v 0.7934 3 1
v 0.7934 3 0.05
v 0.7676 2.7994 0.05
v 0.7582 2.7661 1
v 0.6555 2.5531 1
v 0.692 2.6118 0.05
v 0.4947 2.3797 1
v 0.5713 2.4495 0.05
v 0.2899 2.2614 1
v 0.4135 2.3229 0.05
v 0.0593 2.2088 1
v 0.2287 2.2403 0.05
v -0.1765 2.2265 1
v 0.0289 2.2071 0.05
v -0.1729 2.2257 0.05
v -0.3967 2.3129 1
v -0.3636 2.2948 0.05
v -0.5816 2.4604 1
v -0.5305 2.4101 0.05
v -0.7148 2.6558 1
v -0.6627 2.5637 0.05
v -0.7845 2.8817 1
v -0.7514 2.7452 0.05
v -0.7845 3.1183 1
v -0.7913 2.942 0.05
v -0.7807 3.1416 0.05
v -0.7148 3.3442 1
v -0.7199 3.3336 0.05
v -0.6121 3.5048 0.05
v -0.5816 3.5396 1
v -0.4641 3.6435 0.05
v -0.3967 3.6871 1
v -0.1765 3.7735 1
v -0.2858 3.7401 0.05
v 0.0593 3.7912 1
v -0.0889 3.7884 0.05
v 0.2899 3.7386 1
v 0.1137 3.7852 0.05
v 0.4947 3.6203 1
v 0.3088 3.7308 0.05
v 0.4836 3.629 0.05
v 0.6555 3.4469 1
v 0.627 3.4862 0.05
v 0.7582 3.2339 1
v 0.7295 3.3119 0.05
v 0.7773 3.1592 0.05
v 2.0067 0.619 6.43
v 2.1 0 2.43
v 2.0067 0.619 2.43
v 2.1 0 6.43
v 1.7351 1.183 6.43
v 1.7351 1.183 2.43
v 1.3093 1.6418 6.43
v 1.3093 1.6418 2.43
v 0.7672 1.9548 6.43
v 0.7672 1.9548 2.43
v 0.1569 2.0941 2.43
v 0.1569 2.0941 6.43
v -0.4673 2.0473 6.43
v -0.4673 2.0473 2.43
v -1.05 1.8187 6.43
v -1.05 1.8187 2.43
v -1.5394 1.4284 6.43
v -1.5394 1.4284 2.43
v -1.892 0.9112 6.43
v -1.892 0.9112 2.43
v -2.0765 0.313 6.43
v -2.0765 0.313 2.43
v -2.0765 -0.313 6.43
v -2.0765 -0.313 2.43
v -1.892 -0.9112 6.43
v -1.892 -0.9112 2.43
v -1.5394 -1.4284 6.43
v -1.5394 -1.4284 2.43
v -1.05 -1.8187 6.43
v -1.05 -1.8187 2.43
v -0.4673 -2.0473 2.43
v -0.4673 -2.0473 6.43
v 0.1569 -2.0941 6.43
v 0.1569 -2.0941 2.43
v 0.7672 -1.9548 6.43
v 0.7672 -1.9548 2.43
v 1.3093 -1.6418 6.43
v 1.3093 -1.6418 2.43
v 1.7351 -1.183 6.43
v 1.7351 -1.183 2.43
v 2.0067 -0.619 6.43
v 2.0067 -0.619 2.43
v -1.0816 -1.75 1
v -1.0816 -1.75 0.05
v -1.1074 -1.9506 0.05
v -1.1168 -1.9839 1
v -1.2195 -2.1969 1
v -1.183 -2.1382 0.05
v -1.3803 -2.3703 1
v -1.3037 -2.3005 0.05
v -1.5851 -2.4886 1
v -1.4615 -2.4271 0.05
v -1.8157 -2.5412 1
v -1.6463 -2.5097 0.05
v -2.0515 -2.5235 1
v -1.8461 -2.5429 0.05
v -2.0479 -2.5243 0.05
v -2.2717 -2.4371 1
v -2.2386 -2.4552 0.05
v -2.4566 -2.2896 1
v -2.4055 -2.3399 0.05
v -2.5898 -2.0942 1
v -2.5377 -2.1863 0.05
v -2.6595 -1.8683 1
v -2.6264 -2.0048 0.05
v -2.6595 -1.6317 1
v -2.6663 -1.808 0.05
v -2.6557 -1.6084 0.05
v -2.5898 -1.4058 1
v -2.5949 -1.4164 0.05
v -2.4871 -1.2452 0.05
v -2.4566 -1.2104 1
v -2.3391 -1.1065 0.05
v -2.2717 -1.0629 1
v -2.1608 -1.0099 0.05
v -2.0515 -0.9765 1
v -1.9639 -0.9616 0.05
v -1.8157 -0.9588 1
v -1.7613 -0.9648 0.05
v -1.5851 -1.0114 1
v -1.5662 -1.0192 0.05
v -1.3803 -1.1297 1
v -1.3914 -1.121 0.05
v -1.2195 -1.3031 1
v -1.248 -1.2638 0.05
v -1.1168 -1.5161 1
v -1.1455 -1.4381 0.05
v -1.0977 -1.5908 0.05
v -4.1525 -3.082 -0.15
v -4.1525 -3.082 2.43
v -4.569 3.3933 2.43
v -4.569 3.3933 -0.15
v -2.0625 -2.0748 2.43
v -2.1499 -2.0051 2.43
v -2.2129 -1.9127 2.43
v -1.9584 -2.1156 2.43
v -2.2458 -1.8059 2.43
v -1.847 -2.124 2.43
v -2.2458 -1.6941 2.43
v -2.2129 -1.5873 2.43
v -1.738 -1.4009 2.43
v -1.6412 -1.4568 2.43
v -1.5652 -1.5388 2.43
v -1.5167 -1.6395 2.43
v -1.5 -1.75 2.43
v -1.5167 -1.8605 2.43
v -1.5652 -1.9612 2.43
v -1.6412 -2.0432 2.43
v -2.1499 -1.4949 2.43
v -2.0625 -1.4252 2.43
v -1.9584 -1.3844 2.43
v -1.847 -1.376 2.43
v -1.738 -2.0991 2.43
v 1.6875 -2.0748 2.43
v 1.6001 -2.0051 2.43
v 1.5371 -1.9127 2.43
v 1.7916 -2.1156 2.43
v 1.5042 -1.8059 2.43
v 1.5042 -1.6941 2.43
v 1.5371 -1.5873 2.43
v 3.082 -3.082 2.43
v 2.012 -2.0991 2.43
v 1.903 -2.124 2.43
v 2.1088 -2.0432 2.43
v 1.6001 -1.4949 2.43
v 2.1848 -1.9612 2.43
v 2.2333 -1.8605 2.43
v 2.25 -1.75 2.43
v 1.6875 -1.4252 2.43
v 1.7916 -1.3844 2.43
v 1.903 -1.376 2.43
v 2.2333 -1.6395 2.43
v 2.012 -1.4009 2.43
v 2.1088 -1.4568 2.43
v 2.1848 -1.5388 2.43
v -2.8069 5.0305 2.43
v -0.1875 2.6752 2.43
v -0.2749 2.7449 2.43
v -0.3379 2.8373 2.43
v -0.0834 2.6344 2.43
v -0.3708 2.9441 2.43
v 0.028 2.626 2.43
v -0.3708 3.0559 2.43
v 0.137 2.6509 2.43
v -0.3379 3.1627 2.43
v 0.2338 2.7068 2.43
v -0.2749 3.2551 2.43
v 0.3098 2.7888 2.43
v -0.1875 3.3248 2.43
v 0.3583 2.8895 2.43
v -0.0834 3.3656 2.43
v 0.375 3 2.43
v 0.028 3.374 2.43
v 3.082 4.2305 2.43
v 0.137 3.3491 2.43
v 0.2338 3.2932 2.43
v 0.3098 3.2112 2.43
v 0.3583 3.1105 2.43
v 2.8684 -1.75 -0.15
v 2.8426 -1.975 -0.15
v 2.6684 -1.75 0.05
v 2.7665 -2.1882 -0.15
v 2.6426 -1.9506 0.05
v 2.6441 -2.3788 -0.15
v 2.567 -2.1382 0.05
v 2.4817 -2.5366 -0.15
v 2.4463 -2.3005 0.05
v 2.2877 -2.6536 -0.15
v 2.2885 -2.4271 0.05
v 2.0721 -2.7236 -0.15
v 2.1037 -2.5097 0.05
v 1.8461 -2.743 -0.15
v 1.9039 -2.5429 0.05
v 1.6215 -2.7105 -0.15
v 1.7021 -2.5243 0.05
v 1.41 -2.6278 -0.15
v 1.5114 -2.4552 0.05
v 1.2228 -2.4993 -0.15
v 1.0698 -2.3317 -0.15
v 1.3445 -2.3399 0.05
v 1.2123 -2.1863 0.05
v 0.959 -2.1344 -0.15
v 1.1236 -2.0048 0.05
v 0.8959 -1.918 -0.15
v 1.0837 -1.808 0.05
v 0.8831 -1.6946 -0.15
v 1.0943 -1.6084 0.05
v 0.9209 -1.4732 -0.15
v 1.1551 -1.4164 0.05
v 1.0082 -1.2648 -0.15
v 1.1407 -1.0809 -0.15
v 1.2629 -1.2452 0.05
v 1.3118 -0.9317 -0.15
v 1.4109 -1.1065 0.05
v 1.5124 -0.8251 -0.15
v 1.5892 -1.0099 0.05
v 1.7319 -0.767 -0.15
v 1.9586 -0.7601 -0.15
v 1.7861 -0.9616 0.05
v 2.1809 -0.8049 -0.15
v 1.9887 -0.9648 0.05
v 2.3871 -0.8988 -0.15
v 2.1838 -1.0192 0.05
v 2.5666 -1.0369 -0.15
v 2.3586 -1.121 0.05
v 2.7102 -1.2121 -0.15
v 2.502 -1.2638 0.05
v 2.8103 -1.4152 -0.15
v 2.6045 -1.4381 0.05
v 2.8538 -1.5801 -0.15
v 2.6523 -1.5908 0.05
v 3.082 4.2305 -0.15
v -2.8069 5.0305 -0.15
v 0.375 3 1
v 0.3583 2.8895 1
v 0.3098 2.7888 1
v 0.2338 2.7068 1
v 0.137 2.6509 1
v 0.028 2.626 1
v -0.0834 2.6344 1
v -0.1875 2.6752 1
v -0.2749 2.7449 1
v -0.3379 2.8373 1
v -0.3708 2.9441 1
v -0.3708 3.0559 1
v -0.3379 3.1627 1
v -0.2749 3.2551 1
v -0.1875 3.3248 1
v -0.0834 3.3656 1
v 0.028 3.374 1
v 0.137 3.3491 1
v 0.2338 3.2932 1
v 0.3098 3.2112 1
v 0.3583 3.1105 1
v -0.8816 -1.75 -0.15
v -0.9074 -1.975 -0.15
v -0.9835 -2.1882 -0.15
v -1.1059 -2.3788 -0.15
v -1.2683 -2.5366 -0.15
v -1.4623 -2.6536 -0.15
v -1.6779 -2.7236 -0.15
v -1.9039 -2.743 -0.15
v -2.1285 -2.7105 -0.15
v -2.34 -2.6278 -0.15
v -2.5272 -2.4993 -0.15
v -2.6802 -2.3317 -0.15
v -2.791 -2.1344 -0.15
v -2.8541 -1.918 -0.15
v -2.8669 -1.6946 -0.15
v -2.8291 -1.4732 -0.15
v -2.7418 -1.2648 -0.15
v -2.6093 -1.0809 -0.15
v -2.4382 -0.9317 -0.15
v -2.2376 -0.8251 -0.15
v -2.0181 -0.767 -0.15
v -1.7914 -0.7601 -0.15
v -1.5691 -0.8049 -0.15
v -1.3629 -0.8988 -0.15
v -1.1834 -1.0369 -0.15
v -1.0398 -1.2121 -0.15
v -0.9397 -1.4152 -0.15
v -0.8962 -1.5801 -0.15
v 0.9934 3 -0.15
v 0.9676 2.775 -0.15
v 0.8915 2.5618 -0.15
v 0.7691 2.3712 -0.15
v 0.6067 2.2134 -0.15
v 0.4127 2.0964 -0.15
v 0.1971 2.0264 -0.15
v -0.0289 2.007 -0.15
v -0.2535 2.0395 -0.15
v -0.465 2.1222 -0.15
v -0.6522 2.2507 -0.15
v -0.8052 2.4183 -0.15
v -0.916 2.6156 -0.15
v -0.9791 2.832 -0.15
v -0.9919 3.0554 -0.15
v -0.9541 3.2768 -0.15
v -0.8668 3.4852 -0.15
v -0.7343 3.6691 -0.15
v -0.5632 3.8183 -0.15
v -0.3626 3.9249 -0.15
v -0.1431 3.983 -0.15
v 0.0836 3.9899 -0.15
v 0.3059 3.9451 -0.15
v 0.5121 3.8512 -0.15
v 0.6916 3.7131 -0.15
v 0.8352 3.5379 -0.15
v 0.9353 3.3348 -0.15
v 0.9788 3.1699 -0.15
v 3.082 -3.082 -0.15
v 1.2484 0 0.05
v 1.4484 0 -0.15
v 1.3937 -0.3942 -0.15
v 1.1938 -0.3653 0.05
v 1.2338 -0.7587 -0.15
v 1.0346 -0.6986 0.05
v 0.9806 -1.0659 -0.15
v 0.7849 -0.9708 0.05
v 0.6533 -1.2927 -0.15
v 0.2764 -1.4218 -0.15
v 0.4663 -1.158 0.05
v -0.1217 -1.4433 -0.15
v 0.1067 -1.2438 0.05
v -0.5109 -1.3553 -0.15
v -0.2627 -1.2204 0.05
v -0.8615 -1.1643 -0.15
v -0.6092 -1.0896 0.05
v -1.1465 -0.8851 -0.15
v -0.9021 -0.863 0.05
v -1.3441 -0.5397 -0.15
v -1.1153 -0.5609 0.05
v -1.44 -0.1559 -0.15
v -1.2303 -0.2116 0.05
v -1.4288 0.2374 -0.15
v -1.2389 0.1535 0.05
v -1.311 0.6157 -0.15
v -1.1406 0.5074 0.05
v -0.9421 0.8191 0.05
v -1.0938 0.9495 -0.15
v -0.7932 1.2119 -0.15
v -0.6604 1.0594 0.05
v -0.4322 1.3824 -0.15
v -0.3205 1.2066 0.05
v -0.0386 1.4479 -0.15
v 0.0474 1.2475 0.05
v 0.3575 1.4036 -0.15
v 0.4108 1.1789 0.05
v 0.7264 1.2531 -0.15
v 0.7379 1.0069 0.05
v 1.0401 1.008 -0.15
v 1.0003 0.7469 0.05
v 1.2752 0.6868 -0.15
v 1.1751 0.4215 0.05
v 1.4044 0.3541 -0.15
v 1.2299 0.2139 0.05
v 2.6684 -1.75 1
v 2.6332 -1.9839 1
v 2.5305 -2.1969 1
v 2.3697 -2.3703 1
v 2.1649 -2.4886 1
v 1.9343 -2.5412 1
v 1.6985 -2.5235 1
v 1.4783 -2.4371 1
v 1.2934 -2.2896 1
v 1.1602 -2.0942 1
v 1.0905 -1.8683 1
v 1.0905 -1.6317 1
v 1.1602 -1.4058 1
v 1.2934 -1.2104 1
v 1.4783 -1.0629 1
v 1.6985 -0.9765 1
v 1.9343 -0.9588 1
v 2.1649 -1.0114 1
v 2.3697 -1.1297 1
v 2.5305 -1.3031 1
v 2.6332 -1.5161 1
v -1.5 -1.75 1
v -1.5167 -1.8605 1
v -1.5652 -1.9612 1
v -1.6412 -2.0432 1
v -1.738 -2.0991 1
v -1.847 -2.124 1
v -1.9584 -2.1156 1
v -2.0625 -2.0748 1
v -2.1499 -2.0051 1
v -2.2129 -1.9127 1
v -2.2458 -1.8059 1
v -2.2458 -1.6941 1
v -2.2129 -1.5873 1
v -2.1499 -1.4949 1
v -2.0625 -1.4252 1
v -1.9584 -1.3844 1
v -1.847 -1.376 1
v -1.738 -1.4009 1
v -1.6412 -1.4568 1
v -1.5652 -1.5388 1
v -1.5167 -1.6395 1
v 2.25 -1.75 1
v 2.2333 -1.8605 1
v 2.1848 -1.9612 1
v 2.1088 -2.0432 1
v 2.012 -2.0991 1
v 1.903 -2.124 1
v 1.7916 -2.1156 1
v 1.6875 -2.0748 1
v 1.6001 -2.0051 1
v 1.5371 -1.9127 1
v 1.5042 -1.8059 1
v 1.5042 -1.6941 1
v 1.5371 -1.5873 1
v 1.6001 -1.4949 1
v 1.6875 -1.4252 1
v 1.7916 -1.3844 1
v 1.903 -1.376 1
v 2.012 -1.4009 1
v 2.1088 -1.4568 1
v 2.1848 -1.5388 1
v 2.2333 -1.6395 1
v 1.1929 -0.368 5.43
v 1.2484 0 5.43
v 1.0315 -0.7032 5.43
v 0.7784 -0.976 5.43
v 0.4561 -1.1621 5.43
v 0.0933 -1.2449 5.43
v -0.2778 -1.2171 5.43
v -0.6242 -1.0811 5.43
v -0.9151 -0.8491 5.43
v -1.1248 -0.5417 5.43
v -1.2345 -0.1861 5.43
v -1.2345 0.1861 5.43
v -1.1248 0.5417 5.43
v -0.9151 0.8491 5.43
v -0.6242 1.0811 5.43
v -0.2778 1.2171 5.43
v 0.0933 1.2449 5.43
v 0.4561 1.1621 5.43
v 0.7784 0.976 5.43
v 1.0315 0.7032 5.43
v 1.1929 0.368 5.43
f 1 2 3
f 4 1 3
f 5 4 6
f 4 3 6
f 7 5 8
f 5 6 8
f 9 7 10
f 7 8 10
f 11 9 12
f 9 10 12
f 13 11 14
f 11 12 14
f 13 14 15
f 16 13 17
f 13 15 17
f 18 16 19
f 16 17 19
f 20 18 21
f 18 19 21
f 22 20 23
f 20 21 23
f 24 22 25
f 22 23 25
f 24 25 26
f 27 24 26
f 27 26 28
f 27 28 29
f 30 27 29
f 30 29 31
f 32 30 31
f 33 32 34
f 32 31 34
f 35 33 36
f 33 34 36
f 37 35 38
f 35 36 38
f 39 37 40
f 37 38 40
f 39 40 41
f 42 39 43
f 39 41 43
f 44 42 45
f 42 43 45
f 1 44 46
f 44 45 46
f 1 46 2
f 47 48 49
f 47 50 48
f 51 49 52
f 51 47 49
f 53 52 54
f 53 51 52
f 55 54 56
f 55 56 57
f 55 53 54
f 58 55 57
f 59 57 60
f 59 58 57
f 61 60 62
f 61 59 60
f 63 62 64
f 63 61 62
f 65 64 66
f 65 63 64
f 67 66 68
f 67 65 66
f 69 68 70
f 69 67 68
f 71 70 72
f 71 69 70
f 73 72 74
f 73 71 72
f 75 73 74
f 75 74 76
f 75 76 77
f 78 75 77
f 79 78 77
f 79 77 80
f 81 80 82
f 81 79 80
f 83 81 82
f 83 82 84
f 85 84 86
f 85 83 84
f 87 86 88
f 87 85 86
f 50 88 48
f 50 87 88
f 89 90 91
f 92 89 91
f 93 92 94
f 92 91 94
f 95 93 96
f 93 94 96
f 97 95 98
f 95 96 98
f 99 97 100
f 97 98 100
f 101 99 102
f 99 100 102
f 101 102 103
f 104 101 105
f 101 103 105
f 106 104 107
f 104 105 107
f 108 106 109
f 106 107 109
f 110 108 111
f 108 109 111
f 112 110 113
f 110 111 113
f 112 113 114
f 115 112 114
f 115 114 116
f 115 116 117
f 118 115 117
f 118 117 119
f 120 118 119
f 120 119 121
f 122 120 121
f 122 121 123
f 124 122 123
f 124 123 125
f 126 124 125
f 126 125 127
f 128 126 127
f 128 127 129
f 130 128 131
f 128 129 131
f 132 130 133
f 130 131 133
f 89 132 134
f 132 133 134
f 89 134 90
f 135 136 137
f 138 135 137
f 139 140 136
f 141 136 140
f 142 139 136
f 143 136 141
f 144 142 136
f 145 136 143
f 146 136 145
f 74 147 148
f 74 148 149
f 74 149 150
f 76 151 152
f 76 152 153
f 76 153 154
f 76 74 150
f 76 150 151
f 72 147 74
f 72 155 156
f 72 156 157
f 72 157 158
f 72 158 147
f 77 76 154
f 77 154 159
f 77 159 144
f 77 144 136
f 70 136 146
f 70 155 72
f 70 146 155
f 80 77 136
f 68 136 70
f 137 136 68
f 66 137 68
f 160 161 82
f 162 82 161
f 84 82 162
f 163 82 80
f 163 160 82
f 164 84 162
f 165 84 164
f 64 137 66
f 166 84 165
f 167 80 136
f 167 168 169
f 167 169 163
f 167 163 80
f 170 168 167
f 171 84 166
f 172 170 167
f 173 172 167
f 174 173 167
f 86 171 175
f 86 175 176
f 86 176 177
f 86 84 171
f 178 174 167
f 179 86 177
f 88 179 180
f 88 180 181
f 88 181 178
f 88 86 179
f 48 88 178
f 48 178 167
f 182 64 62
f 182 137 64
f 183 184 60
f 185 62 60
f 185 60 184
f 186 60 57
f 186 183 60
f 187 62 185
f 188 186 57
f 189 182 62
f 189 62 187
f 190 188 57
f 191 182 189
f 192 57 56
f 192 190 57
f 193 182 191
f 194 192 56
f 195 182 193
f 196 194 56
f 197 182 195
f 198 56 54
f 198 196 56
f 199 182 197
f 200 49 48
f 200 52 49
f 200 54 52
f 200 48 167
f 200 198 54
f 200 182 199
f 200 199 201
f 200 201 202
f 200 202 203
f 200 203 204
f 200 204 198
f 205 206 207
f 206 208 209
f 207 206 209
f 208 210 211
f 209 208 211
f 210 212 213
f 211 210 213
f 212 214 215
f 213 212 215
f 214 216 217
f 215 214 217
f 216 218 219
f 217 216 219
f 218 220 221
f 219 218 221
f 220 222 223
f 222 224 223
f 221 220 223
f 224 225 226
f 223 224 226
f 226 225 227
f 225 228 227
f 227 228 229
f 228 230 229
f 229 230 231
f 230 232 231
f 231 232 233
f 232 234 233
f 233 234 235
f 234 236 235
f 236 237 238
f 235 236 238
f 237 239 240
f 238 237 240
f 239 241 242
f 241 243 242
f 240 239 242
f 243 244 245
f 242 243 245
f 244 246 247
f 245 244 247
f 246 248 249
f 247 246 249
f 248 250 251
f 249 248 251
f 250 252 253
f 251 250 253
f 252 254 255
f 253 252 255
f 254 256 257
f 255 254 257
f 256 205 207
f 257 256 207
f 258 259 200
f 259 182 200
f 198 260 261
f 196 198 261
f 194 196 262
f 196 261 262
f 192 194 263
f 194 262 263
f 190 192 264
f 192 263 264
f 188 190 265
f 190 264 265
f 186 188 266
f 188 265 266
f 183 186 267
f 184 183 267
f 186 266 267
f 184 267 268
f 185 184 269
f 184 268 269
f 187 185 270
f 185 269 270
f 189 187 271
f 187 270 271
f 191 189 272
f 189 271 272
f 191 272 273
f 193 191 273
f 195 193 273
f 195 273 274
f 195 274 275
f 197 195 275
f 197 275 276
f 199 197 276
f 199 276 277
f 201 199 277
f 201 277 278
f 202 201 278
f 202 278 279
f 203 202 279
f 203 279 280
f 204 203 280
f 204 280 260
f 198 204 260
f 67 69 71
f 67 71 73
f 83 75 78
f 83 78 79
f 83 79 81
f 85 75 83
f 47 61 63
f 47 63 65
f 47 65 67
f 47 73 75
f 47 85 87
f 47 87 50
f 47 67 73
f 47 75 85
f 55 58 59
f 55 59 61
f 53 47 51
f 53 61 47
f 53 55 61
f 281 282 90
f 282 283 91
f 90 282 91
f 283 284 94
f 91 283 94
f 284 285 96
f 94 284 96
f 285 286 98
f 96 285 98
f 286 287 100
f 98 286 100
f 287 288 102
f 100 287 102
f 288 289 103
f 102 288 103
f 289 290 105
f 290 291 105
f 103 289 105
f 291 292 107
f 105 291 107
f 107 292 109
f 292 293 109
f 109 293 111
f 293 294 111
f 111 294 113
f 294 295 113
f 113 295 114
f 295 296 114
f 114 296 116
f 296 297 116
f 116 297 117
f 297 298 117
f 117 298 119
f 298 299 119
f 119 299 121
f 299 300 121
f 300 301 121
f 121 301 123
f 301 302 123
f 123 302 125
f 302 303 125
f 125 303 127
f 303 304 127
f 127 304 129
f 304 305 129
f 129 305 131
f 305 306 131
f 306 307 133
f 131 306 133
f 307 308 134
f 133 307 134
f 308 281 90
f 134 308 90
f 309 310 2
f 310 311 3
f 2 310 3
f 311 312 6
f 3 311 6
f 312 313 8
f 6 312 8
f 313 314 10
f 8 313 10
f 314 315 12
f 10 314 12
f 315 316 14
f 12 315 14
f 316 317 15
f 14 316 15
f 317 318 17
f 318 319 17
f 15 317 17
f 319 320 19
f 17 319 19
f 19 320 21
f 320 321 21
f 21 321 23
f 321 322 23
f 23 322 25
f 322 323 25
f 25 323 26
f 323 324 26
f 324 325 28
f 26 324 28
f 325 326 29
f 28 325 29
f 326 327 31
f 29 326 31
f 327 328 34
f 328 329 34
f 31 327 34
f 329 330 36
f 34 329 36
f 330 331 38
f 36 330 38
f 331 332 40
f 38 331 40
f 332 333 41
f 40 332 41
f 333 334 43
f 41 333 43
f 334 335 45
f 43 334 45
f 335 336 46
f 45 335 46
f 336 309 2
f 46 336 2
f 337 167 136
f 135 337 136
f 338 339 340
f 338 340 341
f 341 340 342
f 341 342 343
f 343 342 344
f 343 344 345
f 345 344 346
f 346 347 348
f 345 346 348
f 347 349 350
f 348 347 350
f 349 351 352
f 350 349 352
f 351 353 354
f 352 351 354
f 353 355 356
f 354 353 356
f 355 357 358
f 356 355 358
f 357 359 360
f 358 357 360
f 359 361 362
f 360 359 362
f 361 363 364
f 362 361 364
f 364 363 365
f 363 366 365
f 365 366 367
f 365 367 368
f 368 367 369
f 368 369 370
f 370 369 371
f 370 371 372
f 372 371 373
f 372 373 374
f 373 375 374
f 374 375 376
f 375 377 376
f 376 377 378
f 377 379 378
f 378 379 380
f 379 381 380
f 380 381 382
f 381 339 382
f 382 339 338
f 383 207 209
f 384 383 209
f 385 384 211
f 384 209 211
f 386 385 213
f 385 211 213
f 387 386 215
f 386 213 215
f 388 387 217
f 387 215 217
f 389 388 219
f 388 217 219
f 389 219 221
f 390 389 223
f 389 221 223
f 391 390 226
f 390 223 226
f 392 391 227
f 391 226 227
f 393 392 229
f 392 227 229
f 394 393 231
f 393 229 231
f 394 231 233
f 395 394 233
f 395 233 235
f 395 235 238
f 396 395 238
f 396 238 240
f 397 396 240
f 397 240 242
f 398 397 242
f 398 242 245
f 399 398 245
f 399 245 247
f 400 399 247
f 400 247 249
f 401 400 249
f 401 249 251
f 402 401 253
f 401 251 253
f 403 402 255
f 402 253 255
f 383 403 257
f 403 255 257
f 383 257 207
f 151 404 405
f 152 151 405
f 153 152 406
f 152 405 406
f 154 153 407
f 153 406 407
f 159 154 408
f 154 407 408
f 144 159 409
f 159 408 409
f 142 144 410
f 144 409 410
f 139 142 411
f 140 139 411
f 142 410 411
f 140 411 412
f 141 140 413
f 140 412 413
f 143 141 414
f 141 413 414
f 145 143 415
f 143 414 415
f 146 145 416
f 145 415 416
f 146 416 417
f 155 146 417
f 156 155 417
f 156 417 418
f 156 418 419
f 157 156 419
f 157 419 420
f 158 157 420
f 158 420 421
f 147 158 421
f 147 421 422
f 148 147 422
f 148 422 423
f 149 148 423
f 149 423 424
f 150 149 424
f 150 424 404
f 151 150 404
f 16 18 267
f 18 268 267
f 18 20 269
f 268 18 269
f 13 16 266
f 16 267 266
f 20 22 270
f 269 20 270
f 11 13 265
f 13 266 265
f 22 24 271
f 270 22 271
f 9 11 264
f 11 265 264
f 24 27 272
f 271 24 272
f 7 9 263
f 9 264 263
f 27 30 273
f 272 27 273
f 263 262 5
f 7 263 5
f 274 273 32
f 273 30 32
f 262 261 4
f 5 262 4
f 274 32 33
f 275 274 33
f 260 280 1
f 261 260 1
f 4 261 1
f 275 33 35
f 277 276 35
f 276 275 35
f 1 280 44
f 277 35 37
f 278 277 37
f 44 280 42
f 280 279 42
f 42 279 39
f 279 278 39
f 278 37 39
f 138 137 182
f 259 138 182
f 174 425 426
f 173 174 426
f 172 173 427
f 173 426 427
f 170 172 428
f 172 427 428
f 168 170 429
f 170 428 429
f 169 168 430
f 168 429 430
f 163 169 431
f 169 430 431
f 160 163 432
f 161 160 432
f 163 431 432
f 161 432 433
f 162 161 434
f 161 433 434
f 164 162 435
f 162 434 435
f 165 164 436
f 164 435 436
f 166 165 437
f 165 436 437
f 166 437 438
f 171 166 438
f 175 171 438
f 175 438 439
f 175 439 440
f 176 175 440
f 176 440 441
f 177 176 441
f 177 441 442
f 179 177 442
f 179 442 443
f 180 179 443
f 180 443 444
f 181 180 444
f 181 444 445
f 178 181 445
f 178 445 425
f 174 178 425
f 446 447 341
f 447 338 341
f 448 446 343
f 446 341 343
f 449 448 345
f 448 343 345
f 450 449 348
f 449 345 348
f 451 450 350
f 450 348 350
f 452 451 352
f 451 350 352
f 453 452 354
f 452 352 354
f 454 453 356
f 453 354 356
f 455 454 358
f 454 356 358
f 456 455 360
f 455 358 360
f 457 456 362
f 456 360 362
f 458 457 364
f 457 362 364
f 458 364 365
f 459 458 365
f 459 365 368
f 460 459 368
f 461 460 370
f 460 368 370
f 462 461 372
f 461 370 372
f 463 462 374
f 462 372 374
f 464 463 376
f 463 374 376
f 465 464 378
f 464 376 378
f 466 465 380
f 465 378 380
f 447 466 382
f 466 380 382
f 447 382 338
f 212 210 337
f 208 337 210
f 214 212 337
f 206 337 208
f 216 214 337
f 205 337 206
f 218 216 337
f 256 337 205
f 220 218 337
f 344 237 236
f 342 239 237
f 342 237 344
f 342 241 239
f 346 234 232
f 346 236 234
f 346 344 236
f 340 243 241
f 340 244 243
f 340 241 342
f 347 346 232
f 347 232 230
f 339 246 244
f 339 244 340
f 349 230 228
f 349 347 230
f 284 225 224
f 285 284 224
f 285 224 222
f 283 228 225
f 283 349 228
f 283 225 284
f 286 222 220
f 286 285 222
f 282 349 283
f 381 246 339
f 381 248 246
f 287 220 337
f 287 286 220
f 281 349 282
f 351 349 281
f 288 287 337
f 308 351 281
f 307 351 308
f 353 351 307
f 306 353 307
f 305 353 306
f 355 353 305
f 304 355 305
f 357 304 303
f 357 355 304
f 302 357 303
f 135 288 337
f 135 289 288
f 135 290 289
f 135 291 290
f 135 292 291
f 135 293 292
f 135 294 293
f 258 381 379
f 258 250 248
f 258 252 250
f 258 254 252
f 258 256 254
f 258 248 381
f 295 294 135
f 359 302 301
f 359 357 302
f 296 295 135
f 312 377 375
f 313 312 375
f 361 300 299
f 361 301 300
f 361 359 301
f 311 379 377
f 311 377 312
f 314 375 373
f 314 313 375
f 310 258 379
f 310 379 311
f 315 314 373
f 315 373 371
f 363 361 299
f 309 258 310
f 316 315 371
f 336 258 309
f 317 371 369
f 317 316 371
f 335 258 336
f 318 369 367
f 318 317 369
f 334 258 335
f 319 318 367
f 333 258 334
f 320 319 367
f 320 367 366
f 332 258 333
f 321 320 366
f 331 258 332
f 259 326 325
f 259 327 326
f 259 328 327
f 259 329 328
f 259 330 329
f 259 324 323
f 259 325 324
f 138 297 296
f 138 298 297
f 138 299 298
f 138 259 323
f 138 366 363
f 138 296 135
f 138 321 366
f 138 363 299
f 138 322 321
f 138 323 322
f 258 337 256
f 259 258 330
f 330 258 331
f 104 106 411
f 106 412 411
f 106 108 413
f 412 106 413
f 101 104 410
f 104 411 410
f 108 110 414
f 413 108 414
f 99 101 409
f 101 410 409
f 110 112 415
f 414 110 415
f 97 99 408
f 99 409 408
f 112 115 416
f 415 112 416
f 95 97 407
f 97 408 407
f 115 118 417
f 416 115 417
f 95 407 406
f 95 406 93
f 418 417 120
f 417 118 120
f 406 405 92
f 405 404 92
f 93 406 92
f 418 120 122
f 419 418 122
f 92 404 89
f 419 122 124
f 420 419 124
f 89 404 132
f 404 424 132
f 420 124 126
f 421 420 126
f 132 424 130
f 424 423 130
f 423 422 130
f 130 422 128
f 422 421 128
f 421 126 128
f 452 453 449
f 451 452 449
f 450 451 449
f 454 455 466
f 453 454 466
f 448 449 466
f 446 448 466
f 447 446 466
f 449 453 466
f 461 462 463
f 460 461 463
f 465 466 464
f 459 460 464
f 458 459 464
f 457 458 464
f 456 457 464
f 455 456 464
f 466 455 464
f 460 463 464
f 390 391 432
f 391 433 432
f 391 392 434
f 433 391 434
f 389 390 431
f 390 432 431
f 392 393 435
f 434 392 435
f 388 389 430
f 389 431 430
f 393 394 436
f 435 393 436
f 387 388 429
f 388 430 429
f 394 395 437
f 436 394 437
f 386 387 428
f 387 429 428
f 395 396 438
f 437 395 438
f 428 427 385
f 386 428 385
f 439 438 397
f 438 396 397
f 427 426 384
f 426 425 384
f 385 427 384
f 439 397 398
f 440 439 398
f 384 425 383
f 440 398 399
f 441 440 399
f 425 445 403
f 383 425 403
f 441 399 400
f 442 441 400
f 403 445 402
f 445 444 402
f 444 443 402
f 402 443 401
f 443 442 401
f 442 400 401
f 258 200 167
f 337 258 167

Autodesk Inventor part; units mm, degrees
ref_plane "YZ Plane" through (0, 0, 0) normal (1, 0, 0) x (0, 1, 0)
ref_plane "XZ Plane" through (0, 0, 0) normal (0, 1, 0) x (-1, 0, 0)
ref_plane "XY Plane" through (0, 0, 0) normal (0, 0, 1) x (1, 0, 0)
sketch "Sketch1" plane through (0, 0, 0) normal (0, 0, 1) x (1, 0, 0)
  line L0 (-2.8403, 5.136) -> (-4.6718, 3.4343)
  line L1 (-4.2463, -3.182) -> (-4.6718, 3.4343)
  line L2 (-4.2463, -3.182) -> (3.182, -3.182)
  line L3 (3.182, -3.182) -> (3.182, 4.3178)
  line L4 (-2.8403, 5.136) -> (3.182, 4.3178)
  circle A0 centre (0, 0) radius 1.2484
  circle A1 centre (0, 3) radius 0.7934
  circle A2 centre (-1.875, -1.75) radius 0.7934
  circle A3 centre (1.875, -1.75) radius 0.7934
  line L5 (-4.569, 3.3933) -> (-2.8069, 5.0305)
  line L6 (-2.8069, 5.0305) -> (3.082, 4.2305)
  line L7 (3.082, 4.2305) -> (3.082, -3.082)
  line L8 (3.082, -3.082) -> (-4.1525, -3.082)
  line L9 (-4.1525, -3.082) -> (-4.569, 3.3933)
  dimension "d0" = 0.1
extrude "Extrusion1" add sketch "Sketch1" along normal blind 1 contours L5 L6 L7 L8 L9
sketch "Sketch2" plane through (0, 0, 1) normal (0, 0, 1) x (1, 0, 0)
  line L0 (-2.8403, 5.136) -> (-4.6718, 3.4343)
  line L1 (-4.2463, -3.182) -> (-4.6718, 3.4343)
  line L2 (-4.2463, -3.182) -> (3.182, -3.182)
  line L3 (3.182, -3.182) -> (3.182, 4.3178)
  line L4 (-2.8403, 5.136) -> (3.182, 4.3178)
  circle A0 centre (0, 0) radius 1.2484
  circle A1 centre (0, 3) radius 0.7934
  circle A2 centre (-1.875, -1.75) radius 0.7934
  circle A3 centre (1.875, -1.75) radius 0.7934
  line L5 (-4.569, 3.3933) -> (-2.8069, 5.0305)
  line L6 (-2.8069, 5.0305) -> (3.082, 4.2305)
  line L7 (3.082, 4.2305) -> (3.082, -3.082)
  line L8 (3.082, -3.082) -> (-4.1525, -3.082)
  line L9 (-4.1525, -3.082) -> (-4.569, 3.3933)
  circle A4 centre (0, 3) radius 0.375
  circle A5 centre (1.875, -1.75) radius 0.375
  circle A6 centre (-1.875, -1.75) radius 0.375
  dimension "d3" = 0.1
  dimension "d4" = 1.5869
  dimension "d5" = 0.75
  dimension "d6" = 0.75
  dimension "d7" = 0.75
extrude "Extrusion2" add sketch "Sketch2" along normal blind 4.43 contours A1 | A2 | A3 | L5 L6 L7 L8 L9
sketch "Sketch3" plane through (0, 0, 5.43) normal (0, 0, 1) x (1, 0, 0)
  line L0 (-2.8403, 5.136) -> (-4.6718, 3.4343)
  line L1 (-4.2463, -3.182) -> (-4.6718, 3.4343)
  line L2 (-4.2463, -3.182) -> (3.182, -3.182)
  line L3 (3.182, -3.182) -> (3.182, 4.3178)
  line L4 (-2.8403, 5.136) -> (3.182, 4.3178)
  circle A0 centre (0, 0) radius 1.2484
  circle A1 centre (0, 3) radius 0.7934
  circle A2 centre (-1.875, -1.75) radius 0.7934
  circle A3 centre (1.875, -1.75) radius 0.7934
  line L5 (-4.569, 3.3933) -> (-2.8069, 5.0305)
  line L6 (-2.8069, 5.0305) -> (3.082, 4.2305)
  line L7 (3.082, 4.2305) -> (3.082, -3.082)
  line L8 (3.082, -3.082) -> (-4.1525, -3.082)
  line L9 (-4.1525, -3.082) -> (-4.569, 3.3933)
  circle A4 centre (0, 3) radius 0.375
  circle A5 centre (1.875, -1.75) radius 0.375
  circle A6 centre (-1.875, -1.75) radius 0.375
  dimension "d10" = 0.1
  dimension "d11" = 1.5869
  dimension "d12" = 0.75
  dimension "d13" = 0.75
  dimension "d14" = 0.75
extrude "Extrusion3" add sketch "Sketch3" along normal blind 1 contours A0 | A1 | A2 | A3 | L5 L6 L7 L8 L9
sketch "Sketch5" plane through (0, 0, 6.43) normal (0, 0, 1) x (1, 0, 0)
  circle A0 centre (0, 0) radius 1.2484 projected
  circle A1 centre (0, 0) radius 2.1
  line L0 (5.5495, -5.5229) -> (-7.4793, -5.5229)
  line L1 (-7.4793, -5.5229) -> (-7.4793, 6.9136)
  line L2 (-7.4793, 6.9136) -> (5.5495, 6.9136)
  line L3 (5.5495, 6.9136) -> (5.5495, -5.5229)
  dimension "d18" = 4.2
extrude "Extrusion4" cut sketch "Sketch5" against normal blind 4 contours L0 L1 L2 L3
sketch "Sketch6" plane through (0, 0, 0) normal (0, 0, -1) x (-1, 0, 0)
  circle A0 centre (0, 0) radius 1.2484 projected
  circle A1 centre (0, 3) radius 0.7934 projected
  circle A2 centre (1.875, -1.75) radius 0.7934 projected
  circle A3 centre (-1.875, -1.75) radius 0.7934 projected
  line L0 (4.569, 3.3933) -> (2.8069, 5.0305) projected
  line L1 (2.8069, 5.0305) -> (-3.082, 4.2305) projected
  line L2 (-3.082, 4.2305) -> (-3.082, -3.082) projected
  line L3 (-3.082, -3.082) -> (4.1525, -3.082) projected
  line L4 (4.1525, -3.082) -> (4.569, 3.3933) projected
extrude "Extrusion5" add sketch "Sketch6" along normal blind 0.15
chamfer "Chamfer1" distance 0.2 angle 45 4 edges at (-1.0816, -1.75, -0.15) (2.6684, -1.75, -0.15) (0.7934, 3, -0.15) (1.2484, 0, -0.15)
properties part number "Cover"
